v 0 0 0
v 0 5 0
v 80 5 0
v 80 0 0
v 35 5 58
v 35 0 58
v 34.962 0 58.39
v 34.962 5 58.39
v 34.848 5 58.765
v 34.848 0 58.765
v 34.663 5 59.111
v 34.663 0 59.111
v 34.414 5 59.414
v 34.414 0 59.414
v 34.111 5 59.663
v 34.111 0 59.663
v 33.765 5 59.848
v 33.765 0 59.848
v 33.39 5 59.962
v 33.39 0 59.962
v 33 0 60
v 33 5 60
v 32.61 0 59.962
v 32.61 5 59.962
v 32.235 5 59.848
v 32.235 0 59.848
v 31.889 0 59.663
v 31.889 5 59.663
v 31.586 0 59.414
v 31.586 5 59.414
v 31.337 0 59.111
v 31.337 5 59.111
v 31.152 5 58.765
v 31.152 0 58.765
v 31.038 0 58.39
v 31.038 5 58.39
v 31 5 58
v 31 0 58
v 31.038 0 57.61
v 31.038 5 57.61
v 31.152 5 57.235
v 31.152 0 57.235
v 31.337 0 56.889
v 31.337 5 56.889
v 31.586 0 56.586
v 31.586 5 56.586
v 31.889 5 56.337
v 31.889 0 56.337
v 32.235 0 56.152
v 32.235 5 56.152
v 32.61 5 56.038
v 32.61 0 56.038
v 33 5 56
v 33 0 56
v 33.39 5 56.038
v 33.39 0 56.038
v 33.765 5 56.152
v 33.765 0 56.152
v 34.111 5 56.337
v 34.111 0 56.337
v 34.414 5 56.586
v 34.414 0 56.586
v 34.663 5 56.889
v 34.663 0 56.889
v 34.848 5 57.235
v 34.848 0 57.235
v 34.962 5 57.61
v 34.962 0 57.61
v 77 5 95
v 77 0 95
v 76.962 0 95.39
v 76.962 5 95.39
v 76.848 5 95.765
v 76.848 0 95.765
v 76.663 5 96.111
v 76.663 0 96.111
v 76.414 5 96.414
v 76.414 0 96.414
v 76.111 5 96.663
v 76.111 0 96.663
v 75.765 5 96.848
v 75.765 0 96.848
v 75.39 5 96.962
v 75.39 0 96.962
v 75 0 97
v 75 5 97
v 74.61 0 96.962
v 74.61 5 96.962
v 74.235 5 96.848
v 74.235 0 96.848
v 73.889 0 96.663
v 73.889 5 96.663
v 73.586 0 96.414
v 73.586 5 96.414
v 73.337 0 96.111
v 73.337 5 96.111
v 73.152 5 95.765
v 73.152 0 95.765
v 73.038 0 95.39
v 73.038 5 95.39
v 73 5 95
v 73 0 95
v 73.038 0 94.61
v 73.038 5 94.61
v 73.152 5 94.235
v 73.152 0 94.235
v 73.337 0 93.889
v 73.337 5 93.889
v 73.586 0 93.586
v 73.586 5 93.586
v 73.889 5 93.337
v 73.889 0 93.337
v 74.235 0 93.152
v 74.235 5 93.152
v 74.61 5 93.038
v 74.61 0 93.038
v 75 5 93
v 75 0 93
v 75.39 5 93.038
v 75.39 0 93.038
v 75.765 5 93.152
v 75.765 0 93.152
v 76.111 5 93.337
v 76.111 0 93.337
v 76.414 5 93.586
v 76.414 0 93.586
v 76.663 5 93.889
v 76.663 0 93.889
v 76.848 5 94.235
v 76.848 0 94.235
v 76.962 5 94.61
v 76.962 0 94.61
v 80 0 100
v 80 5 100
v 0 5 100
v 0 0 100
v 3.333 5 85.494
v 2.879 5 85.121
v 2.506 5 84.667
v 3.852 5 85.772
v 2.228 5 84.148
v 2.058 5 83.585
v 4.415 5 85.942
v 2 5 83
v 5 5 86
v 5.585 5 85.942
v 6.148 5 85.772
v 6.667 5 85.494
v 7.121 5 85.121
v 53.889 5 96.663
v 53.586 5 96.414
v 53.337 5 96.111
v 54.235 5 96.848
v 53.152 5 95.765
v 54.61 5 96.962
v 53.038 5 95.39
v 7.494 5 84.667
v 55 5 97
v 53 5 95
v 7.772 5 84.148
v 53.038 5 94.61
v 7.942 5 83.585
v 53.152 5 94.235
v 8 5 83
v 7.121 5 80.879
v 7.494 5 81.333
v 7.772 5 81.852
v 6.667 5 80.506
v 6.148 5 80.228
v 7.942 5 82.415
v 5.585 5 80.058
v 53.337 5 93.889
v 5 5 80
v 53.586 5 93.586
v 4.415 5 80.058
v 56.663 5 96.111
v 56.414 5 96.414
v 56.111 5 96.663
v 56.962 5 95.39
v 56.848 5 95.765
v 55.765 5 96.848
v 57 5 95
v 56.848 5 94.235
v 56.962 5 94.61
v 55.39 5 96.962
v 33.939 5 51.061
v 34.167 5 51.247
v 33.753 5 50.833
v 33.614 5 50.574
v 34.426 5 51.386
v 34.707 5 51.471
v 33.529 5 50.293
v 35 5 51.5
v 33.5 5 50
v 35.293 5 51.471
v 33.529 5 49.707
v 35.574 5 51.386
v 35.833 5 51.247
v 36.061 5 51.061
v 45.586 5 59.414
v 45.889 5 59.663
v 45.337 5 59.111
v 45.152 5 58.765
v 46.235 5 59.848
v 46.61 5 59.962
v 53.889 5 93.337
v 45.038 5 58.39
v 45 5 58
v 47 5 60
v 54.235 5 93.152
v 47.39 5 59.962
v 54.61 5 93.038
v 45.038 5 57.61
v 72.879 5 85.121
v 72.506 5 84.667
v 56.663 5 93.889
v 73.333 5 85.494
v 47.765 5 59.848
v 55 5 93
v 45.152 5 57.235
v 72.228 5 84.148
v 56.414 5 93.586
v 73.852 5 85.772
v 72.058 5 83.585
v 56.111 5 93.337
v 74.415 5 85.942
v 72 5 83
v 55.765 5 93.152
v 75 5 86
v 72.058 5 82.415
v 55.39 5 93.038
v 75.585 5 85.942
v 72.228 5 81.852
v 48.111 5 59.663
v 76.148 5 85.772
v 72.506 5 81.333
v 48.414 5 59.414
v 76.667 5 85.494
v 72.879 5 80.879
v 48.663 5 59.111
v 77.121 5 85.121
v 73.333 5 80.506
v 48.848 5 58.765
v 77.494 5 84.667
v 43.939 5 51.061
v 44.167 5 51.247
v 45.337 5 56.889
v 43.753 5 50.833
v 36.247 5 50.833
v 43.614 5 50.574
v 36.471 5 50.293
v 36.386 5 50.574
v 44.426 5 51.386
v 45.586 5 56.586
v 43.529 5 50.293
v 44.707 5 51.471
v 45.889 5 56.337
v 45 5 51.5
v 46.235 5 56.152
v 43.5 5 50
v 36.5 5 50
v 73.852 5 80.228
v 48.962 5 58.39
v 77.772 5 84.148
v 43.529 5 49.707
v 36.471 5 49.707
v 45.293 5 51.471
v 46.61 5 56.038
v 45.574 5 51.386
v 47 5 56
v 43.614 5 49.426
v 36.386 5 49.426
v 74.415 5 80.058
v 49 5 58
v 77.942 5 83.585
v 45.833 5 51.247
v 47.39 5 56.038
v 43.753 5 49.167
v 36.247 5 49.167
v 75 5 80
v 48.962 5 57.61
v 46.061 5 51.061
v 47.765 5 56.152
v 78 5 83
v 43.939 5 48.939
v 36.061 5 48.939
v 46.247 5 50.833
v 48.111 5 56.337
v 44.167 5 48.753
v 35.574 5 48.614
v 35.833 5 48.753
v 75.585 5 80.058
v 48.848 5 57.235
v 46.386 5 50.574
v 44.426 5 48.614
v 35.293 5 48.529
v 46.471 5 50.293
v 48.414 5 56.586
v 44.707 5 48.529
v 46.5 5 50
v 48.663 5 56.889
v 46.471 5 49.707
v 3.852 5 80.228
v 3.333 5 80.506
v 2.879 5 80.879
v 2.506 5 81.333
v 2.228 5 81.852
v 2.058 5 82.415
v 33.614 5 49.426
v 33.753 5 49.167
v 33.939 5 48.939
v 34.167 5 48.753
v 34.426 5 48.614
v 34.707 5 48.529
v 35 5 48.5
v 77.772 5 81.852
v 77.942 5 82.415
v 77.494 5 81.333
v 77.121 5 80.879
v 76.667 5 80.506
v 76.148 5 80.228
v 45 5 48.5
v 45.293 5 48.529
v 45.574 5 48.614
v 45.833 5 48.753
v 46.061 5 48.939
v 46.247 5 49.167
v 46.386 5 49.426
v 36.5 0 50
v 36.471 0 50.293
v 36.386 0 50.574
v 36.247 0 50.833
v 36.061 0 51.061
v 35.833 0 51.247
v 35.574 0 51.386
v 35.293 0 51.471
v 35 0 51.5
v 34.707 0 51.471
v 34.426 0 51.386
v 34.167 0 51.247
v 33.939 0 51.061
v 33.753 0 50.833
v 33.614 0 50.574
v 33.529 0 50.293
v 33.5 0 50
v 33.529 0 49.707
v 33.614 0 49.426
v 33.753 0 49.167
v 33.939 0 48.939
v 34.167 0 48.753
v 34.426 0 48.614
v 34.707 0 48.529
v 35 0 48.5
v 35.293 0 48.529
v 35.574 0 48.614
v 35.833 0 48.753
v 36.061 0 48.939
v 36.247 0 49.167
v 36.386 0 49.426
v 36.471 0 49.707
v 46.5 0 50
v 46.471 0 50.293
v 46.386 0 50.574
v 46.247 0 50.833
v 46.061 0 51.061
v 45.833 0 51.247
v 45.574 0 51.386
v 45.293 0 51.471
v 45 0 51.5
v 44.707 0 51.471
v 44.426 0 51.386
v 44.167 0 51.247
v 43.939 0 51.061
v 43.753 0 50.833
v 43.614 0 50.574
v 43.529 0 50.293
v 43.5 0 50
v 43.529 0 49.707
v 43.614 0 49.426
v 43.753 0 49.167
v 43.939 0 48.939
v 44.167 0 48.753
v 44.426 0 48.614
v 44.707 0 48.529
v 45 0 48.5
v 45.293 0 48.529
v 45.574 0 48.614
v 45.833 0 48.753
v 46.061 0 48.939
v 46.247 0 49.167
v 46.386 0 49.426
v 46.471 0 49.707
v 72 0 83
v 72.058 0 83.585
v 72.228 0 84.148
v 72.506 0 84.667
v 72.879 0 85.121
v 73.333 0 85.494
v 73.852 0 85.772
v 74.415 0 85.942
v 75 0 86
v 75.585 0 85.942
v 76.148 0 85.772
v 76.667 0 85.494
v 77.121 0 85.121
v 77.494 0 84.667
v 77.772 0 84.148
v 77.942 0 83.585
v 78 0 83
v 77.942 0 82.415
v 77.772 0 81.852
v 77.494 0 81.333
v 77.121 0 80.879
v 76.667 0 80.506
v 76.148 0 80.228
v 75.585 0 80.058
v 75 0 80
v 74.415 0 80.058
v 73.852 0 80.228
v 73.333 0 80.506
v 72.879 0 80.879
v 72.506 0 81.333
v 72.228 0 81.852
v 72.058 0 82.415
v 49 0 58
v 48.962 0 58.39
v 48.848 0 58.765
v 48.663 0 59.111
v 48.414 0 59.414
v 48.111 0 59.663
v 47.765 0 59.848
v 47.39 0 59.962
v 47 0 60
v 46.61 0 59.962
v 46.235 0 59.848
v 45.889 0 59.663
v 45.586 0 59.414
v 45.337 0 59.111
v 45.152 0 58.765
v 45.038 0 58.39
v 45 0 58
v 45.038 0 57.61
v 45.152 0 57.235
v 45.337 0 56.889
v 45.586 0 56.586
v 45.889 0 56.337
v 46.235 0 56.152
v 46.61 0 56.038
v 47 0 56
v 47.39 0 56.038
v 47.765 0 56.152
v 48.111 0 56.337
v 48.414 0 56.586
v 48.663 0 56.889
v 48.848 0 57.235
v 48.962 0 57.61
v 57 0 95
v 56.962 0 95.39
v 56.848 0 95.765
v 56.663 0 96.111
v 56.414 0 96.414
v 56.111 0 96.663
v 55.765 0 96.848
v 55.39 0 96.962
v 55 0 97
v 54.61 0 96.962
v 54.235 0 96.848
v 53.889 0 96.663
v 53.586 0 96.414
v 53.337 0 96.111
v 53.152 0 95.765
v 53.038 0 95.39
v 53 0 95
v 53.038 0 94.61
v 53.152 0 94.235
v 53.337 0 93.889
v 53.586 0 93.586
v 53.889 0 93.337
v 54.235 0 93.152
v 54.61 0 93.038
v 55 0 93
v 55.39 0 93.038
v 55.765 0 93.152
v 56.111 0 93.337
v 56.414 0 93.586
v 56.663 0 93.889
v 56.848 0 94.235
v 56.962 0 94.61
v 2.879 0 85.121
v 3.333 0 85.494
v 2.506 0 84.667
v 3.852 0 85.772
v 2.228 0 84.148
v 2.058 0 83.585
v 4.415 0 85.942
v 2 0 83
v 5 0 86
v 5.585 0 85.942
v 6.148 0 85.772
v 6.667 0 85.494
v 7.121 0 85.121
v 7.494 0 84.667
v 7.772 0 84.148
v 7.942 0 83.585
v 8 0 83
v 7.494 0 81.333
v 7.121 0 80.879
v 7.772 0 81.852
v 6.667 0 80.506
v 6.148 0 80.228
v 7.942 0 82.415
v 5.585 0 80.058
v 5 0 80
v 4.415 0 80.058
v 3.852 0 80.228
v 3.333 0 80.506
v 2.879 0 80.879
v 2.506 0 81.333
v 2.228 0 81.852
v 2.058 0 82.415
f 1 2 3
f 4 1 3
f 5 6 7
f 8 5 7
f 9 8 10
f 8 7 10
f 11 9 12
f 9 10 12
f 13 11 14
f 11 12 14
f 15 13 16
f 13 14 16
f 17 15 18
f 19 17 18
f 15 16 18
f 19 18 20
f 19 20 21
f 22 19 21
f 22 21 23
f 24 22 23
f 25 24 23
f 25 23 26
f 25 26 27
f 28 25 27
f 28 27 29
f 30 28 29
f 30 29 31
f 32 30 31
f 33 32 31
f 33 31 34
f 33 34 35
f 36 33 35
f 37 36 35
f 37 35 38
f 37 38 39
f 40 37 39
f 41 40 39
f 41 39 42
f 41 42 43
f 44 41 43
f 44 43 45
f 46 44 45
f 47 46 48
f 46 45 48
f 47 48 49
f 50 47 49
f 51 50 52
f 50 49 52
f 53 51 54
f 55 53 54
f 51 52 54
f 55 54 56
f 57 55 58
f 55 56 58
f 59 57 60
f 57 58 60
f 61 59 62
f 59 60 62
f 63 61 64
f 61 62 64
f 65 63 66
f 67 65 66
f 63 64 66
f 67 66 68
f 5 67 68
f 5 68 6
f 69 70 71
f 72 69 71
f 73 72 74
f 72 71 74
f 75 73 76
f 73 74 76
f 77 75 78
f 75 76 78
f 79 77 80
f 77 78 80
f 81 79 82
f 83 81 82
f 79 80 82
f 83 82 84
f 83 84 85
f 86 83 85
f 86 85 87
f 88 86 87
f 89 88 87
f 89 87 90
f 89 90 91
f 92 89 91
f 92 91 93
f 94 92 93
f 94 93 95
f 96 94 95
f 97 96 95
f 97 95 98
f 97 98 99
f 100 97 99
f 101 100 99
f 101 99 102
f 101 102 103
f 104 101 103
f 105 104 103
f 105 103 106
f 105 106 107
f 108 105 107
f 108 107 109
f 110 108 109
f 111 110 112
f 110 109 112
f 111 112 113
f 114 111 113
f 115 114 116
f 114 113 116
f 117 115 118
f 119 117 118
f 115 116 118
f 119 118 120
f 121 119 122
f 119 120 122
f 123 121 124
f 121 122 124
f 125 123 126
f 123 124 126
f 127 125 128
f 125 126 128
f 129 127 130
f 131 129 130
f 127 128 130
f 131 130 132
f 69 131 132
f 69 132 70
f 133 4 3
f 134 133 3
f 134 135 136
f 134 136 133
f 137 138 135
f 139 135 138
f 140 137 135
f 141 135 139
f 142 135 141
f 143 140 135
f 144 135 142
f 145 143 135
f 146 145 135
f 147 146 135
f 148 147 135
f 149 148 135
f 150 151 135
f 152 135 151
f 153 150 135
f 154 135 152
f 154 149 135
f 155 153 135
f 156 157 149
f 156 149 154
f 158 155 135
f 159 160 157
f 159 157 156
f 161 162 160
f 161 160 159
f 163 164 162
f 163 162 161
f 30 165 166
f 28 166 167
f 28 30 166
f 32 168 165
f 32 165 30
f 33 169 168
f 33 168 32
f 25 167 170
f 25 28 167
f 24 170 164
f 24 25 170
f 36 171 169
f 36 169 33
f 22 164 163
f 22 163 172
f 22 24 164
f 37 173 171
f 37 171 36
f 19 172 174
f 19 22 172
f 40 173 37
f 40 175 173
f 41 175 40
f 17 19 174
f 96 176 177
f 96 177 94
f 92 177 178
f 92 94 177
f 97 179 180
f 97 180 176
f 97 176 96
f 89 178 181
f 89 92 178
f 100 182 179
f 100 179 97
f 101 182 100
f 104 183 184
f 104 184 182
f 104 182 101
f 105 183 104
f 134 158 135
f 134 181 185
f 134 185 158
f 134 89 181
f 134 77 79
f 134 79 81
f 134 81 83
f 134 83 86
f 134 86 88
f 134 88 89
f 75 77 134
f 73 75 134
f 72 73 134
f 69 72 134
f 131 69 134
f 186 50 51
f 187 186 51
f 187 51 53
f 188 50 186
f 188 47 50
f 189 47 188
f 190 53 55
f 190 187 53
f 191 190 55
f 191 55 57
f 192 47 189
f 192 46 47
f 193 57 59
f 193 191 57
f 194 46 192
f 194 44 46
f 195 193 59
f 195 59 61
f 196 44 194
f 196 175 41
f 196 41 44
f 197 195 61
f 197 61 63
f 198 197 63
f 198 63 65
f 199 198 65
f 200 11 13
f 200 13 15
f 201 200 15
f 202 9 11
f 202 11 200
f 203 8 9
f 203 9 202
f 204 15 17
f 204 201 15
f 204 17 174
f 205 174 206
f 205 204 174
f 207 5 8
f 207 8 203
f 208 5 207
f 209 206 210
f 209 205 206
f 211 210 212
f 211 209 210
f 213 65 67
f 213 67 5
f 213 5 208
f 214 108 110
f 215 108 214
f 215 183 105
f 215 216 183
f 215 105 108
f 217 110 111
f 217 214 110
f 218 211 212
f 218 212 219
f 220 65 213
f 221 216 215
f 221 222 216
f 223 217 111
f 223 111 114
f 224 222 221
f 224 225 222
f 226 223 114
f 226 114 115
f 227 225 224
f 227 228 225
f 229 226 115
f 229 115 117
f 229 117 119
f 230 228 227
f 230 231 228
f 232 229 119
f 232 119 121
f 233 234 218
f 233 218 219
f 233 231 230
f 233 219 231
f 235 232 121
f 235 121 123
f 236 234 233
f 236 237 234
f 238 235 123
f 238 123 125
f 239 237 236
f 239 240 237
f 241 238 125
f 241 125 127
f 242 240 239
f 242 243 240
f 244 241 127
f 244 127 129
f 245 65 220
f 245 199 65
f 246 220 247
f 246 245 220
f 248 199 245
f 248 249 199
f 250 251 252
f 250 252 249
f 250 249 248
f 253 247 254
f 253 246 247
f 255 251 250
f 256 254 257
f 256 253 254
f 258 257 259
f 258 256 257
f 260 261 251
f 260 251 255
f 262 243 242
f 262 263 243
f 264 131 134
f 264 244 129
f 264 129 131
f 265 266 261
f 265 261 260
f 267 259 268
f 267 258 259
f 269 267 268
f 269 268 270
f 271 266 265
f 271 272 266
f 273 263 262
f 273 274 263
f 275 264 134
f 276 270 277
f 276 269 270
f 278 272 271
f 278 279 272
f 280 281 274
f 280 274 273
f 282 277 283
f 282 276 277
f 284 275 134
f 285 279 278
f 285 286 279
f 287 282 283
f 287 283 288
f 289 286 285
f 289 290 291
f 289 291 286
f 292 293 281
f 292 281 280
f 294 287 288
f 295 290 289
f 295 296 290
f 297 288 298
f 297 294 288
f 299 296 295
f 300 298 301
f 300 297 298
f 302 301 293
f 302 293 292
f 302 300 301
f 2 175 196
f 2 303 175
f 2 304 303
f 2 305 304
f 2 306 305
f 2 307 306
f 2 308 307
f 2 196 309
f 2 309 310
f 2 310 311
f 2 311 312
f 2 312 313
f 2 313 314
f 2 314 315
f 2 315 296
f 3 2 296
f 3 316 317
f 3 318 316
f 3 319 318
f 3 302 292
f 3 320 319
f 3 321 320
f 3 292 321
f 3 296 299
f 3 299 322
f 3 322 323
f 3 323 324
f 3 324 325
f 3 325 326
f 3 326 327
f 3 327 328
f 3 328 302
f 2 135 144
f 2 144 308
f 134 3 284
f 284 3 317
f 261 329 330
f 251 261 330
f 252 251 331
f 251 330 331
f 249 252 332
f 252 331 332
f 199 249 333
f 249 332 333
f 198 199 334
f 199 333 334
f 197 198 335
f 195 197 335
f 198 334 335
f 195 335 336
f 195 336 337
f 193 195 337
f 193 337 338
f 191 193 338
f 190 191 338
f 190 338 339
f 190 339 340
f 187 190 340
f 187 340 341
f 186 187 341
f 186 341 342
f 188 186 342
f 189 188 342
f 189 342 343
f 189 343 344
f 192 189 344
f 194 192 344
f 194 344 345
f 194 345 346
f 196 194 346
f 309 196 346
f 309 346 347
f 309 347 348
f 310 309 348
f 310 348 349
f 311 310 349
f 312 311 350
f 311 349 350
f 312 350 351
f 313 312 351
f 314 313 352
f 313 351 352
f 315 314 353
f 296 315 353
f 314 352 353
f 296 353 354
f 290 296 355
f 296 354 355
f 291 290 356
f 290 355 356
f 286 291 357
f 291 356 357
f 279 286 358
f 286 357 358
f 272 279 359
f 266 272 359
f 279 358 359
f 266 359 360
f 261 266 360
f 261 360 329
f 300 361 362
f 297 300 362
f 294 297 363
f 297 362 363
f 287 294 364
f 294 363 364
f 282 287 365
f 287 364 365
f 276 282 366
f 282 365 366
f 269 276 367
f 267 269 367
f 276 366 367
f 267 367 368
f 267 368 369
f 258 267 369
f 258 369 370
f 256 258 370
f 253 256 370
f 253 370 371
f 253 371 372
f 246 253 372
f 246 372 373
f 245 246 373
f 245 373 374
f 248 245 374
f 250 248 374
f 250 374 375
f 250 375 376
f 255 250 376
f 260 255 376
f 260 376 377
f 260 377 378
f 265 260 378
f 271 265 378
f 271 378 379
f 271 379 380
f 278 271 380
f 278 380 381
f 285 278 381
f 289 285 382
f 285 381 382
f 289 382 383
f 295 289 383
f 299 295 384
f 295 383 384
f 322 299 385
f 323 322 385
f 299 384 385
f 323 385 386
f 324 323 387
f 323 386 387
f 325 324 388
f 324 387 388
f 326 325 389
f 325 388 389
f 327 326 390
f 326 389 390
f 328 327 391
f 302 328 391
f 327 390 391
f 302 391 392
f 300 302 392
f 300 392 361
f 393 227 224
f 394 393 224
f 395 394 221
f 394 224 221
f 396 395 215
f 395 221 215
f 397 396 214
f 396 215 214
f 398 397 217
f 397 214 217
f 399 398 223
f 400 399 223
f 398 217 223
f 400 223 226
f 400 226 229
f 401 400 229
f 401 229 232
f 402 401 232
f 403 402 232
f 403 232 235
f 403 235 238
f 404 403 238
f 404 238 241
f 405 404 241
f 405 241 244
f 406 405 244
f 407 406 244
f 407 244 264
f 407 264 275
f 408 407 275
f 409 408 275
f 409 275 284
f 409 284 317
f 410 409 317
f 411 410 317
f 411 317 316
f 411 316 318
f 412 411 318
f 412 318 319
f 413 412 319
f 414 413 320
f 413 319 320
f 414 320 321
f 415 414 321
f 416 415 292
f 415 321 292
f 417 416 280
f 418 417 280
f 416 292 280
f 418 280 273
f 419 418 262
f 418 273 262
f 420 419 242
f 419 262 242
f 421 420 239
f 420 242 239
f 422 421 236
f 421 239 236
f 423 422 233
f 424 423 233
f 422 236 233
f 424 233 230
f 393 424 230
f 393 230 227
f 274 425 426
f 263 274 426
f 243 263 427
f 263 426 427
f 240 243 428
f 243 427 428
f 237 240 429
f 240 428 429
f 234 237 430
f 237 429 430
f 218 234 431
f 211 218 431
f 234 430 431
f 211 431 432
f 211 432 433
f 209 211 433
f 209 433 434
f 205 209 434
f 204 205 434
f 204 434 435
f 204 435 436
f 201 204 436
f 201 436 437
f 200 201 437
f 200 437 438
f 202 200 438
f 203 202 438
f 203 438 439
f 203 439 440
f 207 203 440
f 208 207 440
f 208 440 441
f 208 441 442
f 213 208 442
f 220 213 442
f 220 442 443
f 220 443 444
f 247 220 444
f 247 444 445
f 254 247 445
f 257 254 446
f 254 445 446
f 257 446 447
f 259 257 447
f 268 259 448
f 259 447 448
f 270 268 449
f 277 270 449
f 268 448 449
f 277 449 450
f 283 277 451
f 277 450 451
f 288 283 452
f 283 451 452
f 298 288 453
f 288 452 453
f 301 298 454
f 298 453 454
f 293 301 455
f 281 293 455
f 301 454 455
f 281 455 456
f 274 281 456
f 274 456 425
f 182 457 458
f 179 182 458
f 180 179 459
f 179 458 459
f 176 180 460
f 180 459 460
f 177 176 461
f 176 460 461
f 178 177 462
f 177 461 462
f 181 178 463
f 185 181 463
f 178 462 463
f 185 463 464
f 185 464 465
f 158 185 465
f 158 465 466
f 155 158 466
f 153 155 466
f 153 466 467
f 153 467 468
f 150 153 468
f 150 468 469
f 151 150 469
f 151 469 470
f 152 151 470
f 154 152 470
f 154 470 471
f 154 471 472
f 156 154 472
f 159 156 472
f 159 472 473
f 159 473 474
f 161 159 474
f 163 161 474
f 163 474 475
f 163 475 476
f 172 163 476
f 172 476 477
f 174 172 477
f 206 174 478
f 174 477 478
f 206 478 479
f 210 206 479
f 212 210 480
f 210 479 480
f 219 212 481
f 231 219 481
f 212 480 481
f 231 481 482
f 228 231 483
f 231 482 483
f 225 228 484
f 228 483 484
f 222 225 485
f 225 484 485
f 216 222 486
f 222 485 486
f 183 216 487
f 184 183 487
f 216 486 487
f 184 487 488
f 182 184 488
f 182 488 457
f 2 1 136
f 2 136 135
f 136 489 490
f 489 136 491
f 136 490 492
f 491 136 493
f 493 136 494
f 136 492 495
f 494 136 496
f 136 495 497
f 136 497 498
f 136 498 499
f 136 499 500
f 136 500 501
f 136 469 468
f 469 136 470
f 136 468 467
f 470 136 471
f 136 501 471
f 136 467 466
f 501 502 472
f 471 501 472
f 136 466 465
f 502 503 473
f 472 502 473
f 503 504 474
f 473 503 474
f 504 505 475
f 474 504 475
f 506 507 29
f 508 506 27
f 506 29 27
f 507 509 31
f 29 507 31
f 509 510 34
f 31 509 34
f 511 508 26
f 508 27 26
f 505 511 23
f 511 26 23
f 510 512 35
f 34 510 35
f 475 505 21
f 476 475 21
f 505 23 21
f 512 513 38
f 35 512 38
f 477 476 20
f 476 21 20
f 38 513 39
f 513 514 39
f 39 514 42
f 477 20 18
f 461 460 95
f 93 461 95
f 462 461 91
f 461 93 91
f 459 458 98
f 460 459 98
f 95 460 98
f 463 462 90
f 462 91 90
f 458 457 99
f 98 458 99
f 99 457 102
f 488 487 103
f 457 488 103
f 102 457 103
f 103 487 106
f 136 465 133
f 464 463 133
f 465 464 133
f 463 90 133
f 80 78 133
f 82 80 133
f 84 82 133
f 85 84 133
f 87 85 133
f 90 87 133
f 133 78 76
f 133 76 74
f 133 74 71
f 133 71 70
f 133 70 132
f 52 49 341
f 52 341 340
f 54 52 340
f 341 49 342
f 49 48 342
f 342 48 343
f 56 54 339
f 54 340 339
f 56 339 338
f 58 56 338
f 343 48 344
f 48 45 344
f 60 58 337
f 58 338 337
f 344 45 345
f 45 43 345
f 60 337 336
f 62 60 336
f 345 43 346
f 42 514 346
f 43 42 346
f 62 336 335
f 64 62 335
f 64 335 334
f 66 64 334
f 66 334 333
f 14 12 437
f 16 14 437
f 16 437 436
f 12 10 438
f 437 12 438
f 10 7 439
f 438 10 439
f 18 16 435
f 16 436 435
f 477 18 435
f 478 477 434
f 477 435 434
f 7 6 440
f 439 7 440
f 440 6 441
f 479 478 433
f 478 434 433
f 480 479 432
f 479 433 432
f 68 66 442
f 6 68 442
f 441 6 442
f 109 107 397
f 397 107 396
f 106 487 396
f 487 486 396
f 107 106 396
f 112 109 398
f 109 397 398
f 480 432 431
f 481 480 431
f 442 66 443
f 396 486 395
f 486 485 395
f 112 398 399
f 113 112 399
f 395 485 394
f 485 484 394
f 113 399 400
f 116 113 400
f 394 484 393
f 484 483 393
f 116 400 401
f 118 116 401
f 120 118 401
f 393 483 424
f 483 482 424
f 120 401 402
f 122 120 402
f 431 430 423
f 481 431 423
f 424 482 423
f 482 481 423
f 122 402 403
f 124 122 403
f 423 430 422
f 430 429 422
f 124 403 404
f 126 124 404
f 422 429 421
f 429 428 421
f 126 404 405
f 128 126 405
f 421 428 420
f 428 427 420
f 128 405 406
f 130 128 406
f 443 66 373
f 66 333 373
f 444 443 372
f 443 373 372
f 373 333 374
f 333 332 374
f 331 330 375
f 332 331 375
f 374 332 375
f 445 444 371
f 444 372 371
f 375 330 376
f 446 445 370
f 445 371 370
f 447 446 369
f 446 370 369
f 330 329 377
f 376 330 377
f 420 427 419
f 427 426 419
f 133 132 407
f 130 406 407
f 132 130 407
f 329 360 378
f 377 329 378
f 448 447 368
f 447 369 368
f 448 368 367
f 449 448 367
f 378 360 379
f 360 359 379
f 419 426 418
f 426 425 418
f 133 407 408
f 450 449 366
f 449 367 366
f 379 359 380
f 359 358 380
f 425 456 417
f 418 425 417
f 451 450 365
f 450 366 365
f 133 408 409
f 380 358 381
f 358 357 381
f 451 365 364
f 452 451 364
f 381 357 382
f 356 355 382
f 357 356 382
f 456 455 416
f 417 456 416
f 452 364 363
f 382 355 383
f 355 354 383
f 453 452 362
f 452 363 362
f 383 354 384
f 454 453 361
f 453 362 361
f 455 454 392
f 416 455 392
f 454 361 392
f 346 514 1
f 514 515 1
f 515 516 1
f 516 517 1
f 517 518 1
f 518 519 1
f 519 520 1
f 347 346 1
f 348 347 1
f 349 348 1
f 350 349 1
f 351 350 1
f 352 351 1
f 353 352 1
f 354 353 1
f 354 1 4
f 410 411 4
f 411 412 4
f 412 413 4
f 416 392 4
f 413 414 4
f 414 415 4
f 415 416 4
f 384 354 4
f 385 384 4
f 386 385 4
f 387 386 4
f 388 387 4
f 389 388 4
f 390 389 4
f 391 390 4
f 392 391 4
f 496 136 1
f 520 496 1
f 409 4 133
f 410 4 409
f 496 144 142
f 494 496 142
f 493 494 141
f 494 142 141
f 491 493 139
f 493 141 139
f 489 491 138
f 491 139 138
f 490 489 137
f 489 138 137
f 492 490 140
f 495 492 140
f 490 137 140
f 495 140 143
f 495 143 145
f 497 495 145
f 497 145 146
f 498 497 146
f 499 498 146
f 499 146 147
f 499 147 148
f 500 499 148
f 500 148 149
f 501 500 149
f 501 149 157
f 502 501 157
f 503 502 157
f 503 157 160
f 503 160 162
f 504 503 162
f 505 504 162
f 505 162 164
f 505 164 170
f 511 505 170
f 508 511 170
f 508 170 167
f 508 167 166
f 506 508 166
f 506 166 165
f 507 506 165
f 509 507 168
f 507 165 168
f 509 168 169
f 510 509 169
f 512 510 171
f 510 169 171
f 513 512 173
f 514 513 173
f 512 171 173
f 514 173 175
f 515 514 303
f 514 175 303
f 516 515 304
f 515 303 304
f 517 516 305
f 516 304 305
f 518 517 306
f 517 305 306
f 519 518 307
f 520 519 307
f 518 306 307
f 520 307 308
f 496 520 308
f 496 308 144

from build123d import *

# Parameters (mm, degrees)
F0_W     = 80
F0_H     = 5
F1_DEPTH = 100
F2_R     = 3
F3_DEPTH = 25
F4_R     = 1.5
F5_DEPTH = 25
F6_R     = 2
F7_DEPTH = 25
F8_R     = 2
F9_DEPTH = 25


with BuildPart() as f1:
    # F0 (on Top) → F1 (new body)
    with BuildSketch(Plane.XY):
        with Locations((40, 2.5)):
            Rectangle(F0_W, F0_H)
    extrude(amount=F1_DEPTH)

    # F2 (on face) → F3 (cut)
    with BuildSketch(Plane(origin=(0, 5, 0), x_dir=(-1, 0, 0), z_dir=(0, 1, 0))):
        with Locations((-5, 83)):
            Circle(F2_R)
        with Locations((-75, 83)):
            Circle(F2_R)
    extrude(amount=-F3_DEPTH, mode=Mode.SUBTRACT)

    # F4 (on face) → F5 (cut)
    with BuildSketch(Plane.XZ):
        with Locations((45, 50)):
            Circle(F4_R)
        with Locations((35, 50)):
            Circle(F4_R)
    extrude(amount=-F5_DEPTH, mode=Mode.SUBTRACT)

    # F6 (on face) → F7 (cut)
    with BuildSketch(Plane.XZ):
        with Locations((75, 95)):
            Circle(F6_R)
        with Locations((55, 95)):
            Circle(F6_R)
    extrude(amount=-F7_DEPTH, mode=Mode.SUBTRACT)

    # F8 (on face) → F9 (cut)
    with BuildSketch(Plane.XZ):
        with Locations((33, 58)):
            Circle(F8_R)
        with Locations((47, 58)):
            Circle(F8_R)
    extrude(amount=-F9_DEPTH, mode=Mode.SUBTRACT)


solid = f1.part
